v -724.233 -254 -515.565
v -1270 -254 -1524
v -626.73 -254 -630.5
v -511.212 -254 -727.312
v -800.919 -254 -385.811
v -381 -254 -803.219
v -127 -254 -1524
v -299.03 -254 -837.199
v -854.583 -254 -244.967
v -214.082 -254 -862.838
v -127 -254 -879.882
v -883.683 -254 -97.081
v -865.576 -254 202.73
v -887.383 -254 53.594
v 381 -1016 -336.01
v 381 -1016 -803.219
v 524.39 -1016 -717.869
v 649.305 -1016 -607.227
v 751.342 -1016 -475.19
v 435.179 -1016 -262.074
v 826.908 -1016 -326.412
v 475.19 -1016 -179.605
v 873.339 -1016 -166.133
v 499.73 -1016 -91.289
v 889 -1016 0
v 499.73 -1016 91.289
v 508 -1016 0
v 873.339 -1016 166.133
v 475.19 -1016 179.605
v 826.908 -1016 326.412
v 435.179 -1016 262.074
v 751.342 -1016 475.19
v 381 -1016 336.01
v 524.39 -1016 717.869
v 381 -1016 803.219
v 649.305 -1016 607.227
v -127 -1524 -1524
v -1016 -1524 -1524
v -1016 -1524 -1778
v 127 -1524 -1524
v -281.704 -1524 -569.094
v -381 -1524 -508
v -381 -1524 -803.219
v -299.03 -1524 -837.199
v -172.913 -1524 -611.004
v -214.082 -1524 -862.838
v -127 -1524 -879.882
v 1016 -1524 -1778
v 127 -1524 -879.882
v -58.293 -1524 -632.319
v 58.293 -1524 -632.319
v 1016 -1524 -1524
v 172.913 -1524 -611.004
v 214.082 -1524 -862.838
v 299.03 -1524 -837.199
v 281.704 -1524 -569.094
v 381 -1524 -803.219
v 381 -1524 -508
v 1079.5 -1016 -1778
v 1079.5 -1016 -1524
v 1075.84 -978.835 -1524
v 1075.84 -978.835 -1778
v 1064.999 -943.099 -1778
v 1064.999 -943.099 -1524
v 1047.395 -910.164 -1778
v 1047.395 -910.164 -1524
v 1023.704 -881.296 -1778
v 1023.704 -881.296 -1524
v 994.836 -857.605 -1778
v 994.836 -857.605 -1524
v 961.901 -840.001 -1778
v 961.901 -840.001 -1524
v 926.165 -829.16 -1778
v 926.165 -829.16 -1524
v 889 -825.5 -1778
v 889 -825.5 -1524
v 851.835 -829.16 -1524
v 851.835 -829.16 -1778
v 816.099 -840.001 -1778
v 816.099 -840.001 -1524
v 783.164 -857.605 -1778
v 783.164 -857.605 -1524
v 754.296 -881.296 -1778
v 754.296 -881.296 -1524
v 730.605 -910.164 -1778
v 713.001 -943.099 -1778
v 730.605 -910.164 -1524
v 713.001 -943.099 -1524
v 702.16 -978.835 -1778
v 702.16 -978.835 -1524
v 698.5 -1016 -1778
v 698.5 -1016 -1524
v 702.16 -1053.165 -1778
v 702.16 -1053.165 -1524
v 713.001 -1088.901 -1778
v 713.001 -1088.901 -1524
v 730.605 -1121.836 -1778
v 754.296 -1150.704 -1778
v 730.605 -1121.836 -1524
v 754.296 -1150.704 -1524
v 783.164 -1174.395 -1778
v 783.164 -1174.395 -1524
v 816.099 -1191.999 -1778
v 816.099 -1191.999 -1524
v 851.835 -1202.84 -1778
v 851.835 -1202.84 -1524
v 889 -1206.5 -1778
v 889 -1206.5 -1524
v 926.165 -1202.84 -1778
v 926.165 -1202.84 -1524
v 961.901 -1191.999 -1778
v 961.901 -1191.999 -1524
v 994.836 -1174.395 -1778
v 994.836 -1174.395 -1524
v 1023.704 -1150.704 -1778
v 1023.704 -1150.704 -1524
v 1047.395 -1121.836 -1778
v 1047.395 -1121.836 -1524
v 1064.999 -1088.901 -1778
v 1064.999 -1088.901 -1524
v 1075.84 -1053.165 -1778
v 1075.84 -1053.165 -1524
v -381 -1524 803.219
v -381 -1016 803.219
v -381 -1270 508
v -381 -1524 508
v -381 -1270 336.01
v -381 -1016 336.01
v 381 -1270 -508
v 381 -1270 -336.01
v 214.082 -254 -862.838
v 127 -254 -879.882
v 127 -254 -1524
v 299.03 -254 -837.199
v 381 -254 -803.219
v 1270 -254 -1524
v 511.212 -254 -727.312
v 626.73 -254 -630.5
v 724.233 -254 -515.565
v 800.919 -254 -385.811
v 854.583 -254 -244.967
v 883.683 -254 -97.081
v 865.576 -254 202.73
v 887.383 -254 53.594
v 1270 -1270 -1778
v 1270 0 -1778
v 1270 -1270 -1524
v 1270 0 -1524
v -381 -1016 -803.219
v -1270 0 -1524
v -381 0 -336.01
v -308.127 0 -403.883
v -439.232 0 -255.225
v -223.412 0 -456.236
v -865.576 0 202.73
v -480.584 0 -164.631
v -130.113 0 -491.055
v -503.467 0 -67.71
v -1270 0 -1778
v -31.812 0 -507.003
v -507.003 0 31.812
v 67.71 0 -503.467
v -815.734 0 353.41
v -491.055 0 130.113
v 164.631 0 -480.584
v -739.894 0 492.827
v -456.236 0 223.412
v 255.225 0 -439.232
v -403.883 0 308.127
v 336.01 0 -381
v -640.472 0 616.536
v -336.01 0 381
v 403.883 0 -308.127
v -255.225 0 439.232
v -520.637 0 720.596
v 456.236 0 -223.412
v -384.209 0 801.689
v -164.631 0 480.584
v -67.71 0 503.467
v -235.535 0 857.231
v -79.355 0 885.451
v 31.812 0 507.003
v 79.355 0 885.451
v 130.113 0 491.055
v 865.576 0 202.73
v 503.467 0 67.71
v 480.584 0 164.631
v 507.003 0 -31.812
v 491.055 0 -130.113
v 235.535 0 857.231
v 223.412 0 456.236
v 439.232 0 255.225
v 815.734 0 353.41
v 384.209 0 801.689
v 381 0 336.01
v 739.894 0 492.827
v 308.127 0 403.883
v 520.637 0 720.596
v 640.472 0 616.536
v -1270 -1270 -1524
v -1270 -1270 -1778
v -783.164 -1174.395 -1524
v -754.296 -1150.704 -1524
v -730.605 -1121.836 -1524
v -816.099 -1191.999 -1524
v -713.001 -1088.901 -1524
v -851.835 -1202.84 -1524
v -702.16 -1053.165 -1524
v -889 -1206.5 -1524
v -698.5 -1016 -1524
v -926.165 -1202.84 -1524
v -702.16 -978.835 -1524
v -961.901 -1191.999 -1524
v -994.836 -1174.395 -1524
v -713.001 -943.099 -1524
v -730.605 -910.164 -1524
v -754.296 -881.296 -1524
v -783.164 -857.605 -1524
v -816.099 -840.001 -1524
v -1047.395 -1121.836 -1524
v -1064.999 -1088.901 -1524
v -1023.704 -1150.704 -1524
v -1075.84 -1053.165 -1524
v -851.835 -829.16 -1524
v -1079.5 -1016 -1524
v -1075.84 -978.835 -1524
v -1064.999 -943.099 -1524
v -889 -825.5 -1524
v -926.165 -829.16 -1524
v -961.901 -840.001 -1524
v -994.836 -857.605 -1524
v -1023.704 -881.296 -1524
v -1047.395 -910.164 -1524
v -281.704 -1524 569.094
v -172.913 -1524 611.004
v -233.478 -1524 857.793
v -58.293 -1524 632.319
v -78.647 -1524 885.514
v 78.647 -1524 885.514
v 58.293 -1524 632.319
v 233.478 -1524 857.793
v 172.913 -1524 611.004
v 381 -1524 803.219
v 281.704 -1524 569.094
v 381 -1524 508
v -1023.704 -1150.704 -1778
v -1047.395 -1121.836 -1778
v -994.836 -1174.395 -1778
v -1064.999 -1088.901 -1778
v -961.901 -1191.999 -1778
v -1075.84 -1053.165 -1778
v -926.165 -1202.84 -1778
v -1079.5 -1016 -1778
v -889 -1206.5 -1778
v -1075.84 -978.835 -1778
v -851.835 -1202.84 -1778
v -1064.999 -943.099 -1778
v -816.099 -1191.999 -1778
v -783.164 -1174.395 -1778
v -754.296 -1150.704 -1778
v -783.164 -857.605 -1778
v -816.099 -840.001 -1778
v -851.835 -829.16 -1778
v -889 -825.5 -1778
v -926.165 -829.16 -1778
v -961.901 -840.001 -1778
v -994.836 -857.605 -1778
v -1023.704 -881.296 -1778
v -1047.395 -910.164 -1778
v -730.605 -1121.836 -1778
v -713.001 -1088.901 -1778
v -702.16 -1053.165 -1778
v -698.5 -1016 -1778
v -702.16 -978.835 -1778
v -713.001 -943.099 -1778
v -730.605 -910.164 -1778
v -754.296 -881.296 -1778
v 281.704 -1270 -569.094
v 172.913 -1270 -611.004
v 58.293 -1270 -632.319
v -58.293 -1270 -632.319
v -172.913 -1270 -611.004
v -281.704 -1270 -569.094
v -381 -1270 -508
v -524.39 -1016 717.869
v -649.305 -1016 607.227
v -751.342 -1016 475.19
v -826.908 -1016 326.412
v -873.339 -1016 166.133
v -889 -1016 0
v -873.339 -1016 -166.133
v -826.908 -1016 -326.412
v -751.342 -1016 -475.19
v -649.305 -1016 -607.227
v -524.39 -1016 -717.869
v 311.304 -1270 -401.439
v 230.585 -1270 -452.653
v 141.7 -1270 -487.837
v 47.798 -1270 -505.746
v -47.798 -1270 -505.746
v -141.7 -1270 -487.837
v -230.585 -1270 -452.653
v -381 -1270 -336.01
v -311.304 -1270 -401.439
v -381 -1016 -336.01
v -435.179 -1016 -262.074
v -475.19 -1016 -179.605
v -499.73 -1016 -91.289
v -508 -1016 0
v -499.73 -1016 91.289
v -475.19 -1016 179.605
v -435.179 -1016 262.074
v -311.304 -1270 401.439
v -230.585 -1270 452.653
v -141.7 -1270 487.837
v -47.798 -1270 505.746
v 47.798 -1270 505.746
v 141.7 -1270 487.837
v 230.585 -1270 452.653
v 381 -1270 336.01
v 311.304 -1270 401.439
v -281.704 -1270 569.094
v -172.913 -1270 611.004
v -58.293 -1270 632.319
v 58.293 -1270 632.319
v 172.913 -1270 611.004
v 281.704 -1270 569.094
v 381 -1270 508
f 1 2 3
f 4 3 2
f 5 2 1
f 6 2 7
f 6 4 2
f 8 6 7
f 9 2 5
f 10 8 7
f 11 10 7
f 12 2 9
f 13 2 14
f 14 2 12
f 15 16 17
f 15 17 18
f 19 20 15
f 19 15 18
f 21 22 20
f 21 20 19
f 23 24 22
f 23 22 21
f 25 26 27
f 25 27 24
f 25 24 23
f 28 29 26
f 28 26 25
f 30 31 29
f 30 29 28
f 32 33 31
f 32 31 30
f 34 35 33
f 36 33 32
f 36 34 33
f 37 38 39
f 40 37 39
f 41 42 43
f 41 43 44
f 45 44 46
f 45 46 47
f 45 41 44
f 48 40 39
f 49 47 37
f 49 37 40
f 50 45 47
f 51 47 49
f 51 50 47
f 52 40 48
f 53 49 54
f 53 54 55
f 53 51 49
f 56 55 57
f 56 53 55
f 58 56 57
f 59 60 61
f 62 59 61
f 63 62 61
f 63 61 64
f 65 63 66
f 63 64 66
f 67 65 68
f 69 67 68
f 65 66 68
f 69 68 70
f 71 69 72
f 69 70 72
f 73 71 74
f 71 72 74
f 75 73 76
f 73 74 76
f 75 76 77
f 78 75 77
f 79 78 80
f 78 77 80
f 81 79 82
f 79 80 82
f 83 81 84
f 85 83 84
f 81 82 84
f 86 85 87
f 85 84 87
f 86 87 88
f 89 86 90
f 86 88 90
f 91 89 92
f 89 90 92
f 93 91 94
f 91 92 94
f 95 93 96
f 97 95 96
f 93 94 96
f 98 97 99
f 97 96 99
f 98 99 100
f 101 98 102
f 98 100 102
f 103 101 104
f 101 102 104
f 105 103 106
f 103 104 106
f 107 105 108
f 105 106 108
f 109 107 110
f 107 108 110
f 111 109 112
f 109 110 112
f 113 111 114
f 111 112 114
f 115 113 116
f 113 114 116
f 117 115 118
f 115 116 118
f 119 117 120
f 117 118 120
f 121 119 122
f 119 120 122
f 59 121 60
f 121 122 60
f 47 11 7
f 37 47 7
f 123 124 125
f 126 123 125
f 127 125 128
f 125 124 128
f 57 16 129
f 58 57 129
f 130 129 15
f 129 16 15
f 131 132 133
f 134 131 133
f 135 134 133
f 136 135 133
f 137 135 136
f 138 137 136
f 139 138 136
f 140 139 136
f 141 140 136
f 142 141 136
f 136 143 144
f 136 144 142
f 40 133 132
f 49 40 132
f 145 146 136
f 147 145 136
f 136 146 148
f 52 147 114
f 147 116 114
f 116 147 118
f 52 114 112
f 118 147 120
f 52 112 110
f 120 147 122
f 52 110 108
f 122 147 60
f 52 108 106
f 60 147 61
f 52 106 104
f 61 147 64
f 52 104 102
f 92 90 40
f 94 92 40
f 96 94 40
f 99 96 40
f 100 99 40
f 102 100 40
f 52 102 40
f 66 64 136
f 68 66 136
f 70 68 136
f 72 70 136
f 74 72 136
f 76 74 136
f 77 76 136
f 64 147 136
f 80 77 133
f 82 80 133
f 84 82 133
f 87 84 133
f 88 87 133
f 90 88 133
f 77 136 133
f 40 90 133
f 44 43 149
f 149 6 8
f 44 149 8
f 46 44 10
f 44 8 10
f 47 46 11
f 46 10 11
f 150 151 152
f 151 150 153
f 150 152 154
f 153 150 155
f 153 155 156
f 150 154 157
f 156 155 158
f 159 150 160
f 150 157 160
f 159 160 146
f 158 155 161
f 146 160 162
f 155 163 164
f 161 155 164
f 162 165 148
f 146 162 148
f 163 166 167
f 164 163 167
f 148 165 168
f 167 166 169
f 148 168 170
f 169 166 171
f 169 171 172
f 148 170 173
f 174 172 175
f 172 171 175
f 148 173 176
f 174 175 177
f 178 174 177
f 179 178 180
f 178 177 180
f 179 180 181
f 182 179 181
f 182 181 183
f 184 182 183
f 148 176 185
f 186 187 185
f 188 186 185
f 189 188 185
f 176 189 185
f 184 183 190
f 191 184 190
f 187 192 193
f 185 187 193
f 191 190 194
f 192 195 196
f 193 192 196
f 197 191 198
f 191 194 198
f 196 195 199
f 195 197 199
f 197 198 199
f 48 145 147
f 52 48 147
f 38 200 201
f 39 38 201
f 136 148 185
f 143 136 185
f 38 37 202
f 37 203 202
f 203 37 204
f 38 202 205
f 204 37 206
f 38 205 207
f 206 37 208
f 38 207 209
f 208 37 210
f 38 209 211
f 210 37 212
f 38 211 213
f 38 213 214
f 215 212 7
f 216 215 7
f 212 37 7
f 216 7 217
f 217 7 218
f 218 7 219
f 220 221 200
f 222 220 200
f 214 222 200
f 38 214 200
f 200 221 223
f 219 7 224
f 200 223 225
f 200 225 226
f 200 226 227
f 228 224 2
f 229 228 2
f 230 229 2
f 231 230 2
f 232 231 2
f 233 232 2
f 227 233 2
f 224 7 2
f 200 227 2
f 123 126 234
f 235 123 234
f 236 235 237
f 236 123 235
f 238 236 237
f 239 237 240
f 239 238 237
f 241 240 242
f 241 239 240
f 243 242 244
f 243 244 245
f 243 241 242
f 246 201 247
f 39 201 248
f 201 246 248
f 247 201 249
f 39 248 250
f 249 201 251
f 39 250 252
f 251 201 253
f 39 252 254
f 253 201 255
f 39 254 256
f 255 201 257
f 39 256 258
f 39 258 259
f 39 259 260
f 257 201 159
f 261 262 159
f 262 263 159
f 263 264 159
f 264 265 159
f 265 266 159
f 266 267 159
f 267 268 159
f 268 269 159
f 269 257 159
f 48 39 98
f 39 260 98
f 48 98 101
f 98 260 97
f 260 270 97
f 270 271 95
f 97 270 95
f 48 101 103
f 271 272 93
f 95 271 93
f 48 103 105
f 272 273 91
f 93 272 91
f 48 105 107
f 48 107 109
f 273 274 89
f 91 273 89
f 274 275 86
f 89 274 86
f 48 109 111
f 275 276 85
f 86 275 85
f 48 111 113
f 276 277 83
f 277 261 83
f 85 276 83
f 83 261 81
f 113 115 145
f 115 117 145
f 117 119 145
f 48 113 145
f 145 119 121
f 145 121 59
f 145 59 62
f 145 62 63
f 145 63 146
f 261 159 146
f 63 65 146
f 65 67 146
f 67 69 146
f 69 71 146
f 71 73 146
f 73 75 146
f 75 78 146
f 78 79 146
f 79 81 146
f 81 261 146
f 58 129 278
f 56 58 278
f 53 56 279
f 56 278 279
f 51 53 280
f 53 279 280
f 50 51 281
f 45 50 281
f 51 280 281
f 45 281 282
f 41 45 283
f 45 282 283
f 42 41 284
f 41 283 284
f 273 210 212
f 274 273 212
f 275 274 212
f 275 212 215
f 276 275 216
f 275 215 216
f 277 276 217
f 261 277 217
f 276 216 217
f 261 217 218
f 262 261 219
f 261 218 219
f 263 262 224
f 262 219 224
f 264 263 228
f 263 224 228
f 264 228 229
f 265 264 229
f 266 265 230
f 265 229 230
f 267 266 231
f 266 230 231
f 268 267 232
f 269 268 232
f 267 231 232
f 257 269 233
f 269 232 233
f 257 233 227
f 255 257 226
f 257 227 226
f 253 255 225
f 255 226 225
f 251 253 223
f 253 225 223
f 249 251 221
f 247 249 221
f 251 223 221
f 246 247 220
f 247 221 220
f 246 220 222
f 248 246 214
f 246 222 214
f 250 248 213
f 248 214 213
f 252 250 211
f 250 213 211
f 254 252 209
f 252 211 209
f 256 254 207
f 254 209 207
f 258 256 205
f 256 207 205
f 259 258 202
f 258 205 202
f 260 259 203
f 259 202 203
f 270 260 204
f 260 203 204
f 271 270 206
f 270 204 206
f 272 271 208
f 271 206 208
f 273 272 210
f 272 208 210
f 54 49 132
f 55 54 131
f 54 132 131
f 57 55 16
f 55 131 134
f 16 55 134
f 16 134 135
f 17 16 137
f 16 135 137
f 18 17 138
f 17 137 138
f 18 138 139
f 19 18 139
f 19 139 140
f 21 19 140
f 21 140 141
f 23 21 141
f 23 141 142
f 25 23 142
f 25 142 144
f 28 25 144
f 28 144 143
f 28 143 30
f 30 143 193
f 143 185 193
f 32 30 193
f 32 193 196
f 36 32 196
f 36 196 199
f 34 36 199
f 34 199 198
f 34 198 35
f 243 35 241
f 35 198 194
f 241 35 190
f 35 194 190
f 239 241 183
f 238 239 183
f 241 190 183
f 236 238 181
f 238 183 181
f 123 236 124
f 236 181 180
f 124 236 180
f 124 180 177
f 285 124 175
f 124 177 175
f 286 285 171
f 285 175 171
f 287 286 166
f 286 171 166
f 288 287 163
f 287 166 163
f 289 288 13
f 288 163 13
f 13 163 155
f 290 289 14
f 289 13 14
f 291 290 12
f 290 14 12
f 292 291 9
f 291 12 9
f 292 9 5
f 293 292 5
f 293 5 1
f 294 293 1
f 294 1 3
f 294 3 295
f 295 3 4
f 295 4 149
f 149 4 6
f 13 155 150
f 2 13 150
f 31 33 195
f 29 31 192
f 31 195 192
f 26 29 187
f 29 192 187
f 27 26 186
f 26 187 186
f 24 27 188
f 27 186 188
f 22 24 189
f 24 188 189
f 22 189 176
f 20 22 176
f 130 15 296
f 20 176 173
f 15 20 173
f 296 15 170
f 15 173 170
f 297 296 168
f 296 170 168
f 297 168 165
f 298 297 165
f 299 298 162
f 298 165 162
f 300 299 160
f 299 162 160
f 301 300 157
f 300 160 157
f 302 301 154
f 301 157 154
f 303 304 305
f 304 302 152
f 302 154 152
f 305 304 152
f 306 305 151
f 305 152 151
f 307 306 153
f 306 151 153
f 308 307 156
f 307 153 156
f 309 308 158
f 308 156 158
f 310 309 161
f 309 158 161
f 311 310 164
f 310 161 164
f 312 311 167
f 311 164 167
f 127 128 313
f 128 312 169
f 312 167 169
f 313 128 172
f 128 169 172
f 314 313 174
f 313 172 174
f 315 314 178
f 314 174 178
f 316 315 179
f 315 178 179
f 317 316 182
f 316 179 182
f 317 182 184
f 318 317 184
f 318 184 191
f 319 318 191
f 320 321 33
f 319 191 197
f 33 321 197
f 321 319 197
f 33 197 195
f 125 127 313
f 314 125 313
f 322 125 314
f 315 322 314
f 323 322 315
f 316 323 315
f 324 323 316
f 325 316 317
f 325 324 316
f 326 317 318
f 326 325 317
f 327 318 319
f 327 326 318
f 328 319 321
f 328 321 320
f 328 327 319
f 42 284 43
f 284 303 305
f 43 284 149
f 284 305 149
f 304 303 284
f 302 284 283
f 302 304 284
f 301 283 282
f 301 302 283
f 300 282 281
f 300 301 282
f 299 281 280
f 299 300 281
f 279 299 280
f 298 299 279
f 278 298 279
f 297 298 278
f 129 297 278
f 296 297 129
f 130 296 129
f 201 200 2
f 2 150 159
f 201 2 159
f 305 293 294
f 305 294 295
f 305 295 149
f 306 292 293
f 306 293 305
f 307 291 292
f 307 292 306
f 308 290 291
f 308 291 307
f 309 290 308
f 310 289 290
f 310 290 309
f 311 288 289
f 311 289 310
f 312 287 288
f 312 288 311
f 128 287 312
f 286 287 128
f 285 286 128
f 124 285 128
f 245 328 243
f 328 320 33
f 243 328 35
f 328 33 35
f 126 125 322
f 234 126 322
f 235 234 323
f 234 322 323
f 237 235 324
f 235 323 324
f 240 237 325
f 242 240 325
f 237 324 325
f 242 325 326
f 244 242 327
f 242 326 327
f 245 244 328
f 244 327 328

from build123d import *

# Parameters (mm, degrees)
F1_DEPTH = 1524
F3_DEPTH = 254
F4_DEPTH = 1524
F5_DEPTH = 1016
F6_DEPTH = 1270
F7_DEPTH = 1524
F2_R     = 190.5
F8_DEPTH = 254
F9_SIZE  = 254


with BuildPart() as f1:
    # F0 (on Front) → F1 (new body)
    with BuildSketch(Plane.XZ):
        Polygon((1270, -1778), (1270, -1524), (127, -1524), (-127, -1524), (-1270, -1524), (-1270, -1778), align=None)
    extrude(amount=F1_DEPTH)

    # F0 (on Front) → F3 (join)
    with BuildSketch(Plane.XZ):
        with BuildLine():
            ThreePointArc((865.5758720776, 202.729893398), (883.1245524491, 102.0393299739), (889, 0))
            ThreePointArc((889, 0), (751.3421324537, -475.1904881203), (381, -803.2185256828))
            ThreePointArc((381, -803.2185256828), (256.8760689515, -851.0791298111), (127, -879.881810245))
            Line((127, -879.881810245), (127, -1524))
            Line((127, -1524), (1270, -1524))
            Line((1270, -1524), (865.5758720776, 202.729893398))
        make_face()
        with BuildLine():
            Line((-127, -1524), (-127, -879.881810245))
            ThreePointArc((-127, -879.881810245), (-256.8760689515, -851.0791298111), (-381, -803.2185256828))
            ThreePointArc((-381, -803.2185256828), (-800.9187890631, -385.8109554247), (-865.5758720776, 202.729893398))
            Line((-865.5758720776, 202.729893398), (-1270, -1524))
            Line((-1270, -1524), (-127, -1524))
        make_face()
    extrude(amount=F3_DEPTH)

    # F0 (on Front) → F4 (join)
    with BuildSketch(Plane.XZ):
        with BuildLine():
            Line((127, -1524), (127, -879.881810245))
            ThreePointArc((127, -879.881810245), (0, -889), (-127, -879.881810245))
            Line((-127, -879.881810245), (-127, -1524))
            Line((-127, -1524), (127, -1524))
        make_face()
        with BuildLine():
            ThreePointArc((127, -879.881810245), (256.8760689515, -851.0791298111), (381, -803.2185256828))
            Line((381, -803.2185256828), (381, -508))
            ThreePointArc((381, -508), (0, -635), (-381, -508))
            Line((-381, -508), (-381, -803.2185256828))
            ThreePointArc((-381, -803.2185256828), (-256.8760689515, -851.0791298111), (-127, -879.881810245))
            ThreePointArc((-127, -879.881810245), (0, -889), (127, -879.881810245))
        make_face()
    extrude(amount=F4_DEPTH)

    # F0 (on Front) → F5 (join)
    with BuildSketch(Plane.XZ):
        with BuildLine():
            ThreePointArc((381, -803.2185256828), (751.3421324537, -475.1904881203), (889, 0))
            ThreePointArc((889, 0), (883.1245524491, 102.0393299739), (865.5758720776, 202.729893398))
            ThreePointArc((865.5758720776, 202.729893398), (691.8341568521, 558.2889031789), (381, 803.2185256828))
            Line((381, 803.2185256828), (381, 508))
            ThreePointArc((381, 508), (567.9612662849, 283.9806331425), (635, 0))
            ThreePointArc((635, 0), (567.9612662849, -283.9806331425), (381, -508))
            Line((381, -508), (381, -803.2185256828))
        make_face()
        with BuildLine():
            Line((381, -336.0104165052), (381, -508))
            ThreePointArc((381, -508), (567.9612662849, -283.9806331425), (635, 0))
            ThreePointArc((635, 0), (567.9612662849, 283.9806331425), (381, 508))
            Line((381, 508), (381, 336.0104165052))
            ThreePointArc((381, 336.0104165052), (475.1904881203, 179.6051224214), (508, 0))
            ThreePointArc((508, 0), (475.1904881203, -179.6051224214), (381, -336.0104165052))
        make_face()
        with BuildLine():
            ThreePointArc((-381, 508), (-635, 0), (-381, -508))
            Line((-381, -508), (-381, -336.0104165052))
            ThreePointArc((-381, -336.0104165052), (-508, 0), (-381, 336.0104165052))
            Line((-381, 336.0104165052), (-381, 508))
        make_face()
        with BuildLine():
            Line((-381, 508), (-381, 803.2185256828))
            ThreePointArc((-381, 803.2185256828), (-691.8341568521, 558.2889031789), (-865.5758720776, 202.729893398))
            ThreePointArc((-865.5758720776, 202.729893398), (-800.9187890631, -385.8109554247), (-381, -803.2185256828))
            Line((-381, -803.2185256828), (-381, -508))
            ThreePointArc((-381, -508), (-635, 0), (-381, 508))
        make_face()
    extrude(amount=F5_DEPTH)

    # F0 (on Front) → F6 (join)
    with BuildSketch(Plane.XZ):
        with BuildLine():
            ThreePointArc((-381, -508), (0, -635), (381, -508))
            Line((381, -508), (381, -336.0104165052))
            ThreePointArc((381, -336.0104165052), (0, -508), (-381, -336.0104165052))
            Line((-381, -336.0104165052), (-381, -508))
        make_face()
        with BuildLine():
            Line((381, 336.0104165052), (381, 508))
            ThreePointArc((381, 508), (0, 635), (-381, 508))
            Line((-381, 508), (-381, 336.0104165052))
            ThreePointArc((-381, 336.0104165052), (0, 508), (381, 336.0104165052))
        make_face()
    extrude(amount=F6_DEPTH)

    # F0 (on Front) → F7 (join)
    with BuildSketch(Plane.XZ):
        with BuildLine():
            Line((381, 508), (381, 803.2185256828))
            ThreePointArc((381, 803.2185256828), (0, 889), (-381, 803.2185256828))
            Line((-381, 803.2185256828), (-381, 508))
            ThreePointArc((-381, 508), (0, 635), (381, 508))
        make_face()
    extrude(amount=F7_DEPTH)

    # F2 (on face) → F8 (cut, through all)
    with BuildSketch(Plane.XY.offset(-1524)):
        with Locations((889, -1016)):
            Circle(F2_R)
        with Locations((-889, -1016)):
            Circle(F2_R)
    extrude(amount=-F8_DEPTH, mode=Mode.SUBTRACT)

    # F9
    f9_edges = [f1.edges().sort_by_distance(p)[0] for p in [
        (-1270, -1524, -1651),
        (1270, -1524, -1651),
    ]]
    chamfer(f9_edges, length=F9_SIZE)


solid = f1.part
